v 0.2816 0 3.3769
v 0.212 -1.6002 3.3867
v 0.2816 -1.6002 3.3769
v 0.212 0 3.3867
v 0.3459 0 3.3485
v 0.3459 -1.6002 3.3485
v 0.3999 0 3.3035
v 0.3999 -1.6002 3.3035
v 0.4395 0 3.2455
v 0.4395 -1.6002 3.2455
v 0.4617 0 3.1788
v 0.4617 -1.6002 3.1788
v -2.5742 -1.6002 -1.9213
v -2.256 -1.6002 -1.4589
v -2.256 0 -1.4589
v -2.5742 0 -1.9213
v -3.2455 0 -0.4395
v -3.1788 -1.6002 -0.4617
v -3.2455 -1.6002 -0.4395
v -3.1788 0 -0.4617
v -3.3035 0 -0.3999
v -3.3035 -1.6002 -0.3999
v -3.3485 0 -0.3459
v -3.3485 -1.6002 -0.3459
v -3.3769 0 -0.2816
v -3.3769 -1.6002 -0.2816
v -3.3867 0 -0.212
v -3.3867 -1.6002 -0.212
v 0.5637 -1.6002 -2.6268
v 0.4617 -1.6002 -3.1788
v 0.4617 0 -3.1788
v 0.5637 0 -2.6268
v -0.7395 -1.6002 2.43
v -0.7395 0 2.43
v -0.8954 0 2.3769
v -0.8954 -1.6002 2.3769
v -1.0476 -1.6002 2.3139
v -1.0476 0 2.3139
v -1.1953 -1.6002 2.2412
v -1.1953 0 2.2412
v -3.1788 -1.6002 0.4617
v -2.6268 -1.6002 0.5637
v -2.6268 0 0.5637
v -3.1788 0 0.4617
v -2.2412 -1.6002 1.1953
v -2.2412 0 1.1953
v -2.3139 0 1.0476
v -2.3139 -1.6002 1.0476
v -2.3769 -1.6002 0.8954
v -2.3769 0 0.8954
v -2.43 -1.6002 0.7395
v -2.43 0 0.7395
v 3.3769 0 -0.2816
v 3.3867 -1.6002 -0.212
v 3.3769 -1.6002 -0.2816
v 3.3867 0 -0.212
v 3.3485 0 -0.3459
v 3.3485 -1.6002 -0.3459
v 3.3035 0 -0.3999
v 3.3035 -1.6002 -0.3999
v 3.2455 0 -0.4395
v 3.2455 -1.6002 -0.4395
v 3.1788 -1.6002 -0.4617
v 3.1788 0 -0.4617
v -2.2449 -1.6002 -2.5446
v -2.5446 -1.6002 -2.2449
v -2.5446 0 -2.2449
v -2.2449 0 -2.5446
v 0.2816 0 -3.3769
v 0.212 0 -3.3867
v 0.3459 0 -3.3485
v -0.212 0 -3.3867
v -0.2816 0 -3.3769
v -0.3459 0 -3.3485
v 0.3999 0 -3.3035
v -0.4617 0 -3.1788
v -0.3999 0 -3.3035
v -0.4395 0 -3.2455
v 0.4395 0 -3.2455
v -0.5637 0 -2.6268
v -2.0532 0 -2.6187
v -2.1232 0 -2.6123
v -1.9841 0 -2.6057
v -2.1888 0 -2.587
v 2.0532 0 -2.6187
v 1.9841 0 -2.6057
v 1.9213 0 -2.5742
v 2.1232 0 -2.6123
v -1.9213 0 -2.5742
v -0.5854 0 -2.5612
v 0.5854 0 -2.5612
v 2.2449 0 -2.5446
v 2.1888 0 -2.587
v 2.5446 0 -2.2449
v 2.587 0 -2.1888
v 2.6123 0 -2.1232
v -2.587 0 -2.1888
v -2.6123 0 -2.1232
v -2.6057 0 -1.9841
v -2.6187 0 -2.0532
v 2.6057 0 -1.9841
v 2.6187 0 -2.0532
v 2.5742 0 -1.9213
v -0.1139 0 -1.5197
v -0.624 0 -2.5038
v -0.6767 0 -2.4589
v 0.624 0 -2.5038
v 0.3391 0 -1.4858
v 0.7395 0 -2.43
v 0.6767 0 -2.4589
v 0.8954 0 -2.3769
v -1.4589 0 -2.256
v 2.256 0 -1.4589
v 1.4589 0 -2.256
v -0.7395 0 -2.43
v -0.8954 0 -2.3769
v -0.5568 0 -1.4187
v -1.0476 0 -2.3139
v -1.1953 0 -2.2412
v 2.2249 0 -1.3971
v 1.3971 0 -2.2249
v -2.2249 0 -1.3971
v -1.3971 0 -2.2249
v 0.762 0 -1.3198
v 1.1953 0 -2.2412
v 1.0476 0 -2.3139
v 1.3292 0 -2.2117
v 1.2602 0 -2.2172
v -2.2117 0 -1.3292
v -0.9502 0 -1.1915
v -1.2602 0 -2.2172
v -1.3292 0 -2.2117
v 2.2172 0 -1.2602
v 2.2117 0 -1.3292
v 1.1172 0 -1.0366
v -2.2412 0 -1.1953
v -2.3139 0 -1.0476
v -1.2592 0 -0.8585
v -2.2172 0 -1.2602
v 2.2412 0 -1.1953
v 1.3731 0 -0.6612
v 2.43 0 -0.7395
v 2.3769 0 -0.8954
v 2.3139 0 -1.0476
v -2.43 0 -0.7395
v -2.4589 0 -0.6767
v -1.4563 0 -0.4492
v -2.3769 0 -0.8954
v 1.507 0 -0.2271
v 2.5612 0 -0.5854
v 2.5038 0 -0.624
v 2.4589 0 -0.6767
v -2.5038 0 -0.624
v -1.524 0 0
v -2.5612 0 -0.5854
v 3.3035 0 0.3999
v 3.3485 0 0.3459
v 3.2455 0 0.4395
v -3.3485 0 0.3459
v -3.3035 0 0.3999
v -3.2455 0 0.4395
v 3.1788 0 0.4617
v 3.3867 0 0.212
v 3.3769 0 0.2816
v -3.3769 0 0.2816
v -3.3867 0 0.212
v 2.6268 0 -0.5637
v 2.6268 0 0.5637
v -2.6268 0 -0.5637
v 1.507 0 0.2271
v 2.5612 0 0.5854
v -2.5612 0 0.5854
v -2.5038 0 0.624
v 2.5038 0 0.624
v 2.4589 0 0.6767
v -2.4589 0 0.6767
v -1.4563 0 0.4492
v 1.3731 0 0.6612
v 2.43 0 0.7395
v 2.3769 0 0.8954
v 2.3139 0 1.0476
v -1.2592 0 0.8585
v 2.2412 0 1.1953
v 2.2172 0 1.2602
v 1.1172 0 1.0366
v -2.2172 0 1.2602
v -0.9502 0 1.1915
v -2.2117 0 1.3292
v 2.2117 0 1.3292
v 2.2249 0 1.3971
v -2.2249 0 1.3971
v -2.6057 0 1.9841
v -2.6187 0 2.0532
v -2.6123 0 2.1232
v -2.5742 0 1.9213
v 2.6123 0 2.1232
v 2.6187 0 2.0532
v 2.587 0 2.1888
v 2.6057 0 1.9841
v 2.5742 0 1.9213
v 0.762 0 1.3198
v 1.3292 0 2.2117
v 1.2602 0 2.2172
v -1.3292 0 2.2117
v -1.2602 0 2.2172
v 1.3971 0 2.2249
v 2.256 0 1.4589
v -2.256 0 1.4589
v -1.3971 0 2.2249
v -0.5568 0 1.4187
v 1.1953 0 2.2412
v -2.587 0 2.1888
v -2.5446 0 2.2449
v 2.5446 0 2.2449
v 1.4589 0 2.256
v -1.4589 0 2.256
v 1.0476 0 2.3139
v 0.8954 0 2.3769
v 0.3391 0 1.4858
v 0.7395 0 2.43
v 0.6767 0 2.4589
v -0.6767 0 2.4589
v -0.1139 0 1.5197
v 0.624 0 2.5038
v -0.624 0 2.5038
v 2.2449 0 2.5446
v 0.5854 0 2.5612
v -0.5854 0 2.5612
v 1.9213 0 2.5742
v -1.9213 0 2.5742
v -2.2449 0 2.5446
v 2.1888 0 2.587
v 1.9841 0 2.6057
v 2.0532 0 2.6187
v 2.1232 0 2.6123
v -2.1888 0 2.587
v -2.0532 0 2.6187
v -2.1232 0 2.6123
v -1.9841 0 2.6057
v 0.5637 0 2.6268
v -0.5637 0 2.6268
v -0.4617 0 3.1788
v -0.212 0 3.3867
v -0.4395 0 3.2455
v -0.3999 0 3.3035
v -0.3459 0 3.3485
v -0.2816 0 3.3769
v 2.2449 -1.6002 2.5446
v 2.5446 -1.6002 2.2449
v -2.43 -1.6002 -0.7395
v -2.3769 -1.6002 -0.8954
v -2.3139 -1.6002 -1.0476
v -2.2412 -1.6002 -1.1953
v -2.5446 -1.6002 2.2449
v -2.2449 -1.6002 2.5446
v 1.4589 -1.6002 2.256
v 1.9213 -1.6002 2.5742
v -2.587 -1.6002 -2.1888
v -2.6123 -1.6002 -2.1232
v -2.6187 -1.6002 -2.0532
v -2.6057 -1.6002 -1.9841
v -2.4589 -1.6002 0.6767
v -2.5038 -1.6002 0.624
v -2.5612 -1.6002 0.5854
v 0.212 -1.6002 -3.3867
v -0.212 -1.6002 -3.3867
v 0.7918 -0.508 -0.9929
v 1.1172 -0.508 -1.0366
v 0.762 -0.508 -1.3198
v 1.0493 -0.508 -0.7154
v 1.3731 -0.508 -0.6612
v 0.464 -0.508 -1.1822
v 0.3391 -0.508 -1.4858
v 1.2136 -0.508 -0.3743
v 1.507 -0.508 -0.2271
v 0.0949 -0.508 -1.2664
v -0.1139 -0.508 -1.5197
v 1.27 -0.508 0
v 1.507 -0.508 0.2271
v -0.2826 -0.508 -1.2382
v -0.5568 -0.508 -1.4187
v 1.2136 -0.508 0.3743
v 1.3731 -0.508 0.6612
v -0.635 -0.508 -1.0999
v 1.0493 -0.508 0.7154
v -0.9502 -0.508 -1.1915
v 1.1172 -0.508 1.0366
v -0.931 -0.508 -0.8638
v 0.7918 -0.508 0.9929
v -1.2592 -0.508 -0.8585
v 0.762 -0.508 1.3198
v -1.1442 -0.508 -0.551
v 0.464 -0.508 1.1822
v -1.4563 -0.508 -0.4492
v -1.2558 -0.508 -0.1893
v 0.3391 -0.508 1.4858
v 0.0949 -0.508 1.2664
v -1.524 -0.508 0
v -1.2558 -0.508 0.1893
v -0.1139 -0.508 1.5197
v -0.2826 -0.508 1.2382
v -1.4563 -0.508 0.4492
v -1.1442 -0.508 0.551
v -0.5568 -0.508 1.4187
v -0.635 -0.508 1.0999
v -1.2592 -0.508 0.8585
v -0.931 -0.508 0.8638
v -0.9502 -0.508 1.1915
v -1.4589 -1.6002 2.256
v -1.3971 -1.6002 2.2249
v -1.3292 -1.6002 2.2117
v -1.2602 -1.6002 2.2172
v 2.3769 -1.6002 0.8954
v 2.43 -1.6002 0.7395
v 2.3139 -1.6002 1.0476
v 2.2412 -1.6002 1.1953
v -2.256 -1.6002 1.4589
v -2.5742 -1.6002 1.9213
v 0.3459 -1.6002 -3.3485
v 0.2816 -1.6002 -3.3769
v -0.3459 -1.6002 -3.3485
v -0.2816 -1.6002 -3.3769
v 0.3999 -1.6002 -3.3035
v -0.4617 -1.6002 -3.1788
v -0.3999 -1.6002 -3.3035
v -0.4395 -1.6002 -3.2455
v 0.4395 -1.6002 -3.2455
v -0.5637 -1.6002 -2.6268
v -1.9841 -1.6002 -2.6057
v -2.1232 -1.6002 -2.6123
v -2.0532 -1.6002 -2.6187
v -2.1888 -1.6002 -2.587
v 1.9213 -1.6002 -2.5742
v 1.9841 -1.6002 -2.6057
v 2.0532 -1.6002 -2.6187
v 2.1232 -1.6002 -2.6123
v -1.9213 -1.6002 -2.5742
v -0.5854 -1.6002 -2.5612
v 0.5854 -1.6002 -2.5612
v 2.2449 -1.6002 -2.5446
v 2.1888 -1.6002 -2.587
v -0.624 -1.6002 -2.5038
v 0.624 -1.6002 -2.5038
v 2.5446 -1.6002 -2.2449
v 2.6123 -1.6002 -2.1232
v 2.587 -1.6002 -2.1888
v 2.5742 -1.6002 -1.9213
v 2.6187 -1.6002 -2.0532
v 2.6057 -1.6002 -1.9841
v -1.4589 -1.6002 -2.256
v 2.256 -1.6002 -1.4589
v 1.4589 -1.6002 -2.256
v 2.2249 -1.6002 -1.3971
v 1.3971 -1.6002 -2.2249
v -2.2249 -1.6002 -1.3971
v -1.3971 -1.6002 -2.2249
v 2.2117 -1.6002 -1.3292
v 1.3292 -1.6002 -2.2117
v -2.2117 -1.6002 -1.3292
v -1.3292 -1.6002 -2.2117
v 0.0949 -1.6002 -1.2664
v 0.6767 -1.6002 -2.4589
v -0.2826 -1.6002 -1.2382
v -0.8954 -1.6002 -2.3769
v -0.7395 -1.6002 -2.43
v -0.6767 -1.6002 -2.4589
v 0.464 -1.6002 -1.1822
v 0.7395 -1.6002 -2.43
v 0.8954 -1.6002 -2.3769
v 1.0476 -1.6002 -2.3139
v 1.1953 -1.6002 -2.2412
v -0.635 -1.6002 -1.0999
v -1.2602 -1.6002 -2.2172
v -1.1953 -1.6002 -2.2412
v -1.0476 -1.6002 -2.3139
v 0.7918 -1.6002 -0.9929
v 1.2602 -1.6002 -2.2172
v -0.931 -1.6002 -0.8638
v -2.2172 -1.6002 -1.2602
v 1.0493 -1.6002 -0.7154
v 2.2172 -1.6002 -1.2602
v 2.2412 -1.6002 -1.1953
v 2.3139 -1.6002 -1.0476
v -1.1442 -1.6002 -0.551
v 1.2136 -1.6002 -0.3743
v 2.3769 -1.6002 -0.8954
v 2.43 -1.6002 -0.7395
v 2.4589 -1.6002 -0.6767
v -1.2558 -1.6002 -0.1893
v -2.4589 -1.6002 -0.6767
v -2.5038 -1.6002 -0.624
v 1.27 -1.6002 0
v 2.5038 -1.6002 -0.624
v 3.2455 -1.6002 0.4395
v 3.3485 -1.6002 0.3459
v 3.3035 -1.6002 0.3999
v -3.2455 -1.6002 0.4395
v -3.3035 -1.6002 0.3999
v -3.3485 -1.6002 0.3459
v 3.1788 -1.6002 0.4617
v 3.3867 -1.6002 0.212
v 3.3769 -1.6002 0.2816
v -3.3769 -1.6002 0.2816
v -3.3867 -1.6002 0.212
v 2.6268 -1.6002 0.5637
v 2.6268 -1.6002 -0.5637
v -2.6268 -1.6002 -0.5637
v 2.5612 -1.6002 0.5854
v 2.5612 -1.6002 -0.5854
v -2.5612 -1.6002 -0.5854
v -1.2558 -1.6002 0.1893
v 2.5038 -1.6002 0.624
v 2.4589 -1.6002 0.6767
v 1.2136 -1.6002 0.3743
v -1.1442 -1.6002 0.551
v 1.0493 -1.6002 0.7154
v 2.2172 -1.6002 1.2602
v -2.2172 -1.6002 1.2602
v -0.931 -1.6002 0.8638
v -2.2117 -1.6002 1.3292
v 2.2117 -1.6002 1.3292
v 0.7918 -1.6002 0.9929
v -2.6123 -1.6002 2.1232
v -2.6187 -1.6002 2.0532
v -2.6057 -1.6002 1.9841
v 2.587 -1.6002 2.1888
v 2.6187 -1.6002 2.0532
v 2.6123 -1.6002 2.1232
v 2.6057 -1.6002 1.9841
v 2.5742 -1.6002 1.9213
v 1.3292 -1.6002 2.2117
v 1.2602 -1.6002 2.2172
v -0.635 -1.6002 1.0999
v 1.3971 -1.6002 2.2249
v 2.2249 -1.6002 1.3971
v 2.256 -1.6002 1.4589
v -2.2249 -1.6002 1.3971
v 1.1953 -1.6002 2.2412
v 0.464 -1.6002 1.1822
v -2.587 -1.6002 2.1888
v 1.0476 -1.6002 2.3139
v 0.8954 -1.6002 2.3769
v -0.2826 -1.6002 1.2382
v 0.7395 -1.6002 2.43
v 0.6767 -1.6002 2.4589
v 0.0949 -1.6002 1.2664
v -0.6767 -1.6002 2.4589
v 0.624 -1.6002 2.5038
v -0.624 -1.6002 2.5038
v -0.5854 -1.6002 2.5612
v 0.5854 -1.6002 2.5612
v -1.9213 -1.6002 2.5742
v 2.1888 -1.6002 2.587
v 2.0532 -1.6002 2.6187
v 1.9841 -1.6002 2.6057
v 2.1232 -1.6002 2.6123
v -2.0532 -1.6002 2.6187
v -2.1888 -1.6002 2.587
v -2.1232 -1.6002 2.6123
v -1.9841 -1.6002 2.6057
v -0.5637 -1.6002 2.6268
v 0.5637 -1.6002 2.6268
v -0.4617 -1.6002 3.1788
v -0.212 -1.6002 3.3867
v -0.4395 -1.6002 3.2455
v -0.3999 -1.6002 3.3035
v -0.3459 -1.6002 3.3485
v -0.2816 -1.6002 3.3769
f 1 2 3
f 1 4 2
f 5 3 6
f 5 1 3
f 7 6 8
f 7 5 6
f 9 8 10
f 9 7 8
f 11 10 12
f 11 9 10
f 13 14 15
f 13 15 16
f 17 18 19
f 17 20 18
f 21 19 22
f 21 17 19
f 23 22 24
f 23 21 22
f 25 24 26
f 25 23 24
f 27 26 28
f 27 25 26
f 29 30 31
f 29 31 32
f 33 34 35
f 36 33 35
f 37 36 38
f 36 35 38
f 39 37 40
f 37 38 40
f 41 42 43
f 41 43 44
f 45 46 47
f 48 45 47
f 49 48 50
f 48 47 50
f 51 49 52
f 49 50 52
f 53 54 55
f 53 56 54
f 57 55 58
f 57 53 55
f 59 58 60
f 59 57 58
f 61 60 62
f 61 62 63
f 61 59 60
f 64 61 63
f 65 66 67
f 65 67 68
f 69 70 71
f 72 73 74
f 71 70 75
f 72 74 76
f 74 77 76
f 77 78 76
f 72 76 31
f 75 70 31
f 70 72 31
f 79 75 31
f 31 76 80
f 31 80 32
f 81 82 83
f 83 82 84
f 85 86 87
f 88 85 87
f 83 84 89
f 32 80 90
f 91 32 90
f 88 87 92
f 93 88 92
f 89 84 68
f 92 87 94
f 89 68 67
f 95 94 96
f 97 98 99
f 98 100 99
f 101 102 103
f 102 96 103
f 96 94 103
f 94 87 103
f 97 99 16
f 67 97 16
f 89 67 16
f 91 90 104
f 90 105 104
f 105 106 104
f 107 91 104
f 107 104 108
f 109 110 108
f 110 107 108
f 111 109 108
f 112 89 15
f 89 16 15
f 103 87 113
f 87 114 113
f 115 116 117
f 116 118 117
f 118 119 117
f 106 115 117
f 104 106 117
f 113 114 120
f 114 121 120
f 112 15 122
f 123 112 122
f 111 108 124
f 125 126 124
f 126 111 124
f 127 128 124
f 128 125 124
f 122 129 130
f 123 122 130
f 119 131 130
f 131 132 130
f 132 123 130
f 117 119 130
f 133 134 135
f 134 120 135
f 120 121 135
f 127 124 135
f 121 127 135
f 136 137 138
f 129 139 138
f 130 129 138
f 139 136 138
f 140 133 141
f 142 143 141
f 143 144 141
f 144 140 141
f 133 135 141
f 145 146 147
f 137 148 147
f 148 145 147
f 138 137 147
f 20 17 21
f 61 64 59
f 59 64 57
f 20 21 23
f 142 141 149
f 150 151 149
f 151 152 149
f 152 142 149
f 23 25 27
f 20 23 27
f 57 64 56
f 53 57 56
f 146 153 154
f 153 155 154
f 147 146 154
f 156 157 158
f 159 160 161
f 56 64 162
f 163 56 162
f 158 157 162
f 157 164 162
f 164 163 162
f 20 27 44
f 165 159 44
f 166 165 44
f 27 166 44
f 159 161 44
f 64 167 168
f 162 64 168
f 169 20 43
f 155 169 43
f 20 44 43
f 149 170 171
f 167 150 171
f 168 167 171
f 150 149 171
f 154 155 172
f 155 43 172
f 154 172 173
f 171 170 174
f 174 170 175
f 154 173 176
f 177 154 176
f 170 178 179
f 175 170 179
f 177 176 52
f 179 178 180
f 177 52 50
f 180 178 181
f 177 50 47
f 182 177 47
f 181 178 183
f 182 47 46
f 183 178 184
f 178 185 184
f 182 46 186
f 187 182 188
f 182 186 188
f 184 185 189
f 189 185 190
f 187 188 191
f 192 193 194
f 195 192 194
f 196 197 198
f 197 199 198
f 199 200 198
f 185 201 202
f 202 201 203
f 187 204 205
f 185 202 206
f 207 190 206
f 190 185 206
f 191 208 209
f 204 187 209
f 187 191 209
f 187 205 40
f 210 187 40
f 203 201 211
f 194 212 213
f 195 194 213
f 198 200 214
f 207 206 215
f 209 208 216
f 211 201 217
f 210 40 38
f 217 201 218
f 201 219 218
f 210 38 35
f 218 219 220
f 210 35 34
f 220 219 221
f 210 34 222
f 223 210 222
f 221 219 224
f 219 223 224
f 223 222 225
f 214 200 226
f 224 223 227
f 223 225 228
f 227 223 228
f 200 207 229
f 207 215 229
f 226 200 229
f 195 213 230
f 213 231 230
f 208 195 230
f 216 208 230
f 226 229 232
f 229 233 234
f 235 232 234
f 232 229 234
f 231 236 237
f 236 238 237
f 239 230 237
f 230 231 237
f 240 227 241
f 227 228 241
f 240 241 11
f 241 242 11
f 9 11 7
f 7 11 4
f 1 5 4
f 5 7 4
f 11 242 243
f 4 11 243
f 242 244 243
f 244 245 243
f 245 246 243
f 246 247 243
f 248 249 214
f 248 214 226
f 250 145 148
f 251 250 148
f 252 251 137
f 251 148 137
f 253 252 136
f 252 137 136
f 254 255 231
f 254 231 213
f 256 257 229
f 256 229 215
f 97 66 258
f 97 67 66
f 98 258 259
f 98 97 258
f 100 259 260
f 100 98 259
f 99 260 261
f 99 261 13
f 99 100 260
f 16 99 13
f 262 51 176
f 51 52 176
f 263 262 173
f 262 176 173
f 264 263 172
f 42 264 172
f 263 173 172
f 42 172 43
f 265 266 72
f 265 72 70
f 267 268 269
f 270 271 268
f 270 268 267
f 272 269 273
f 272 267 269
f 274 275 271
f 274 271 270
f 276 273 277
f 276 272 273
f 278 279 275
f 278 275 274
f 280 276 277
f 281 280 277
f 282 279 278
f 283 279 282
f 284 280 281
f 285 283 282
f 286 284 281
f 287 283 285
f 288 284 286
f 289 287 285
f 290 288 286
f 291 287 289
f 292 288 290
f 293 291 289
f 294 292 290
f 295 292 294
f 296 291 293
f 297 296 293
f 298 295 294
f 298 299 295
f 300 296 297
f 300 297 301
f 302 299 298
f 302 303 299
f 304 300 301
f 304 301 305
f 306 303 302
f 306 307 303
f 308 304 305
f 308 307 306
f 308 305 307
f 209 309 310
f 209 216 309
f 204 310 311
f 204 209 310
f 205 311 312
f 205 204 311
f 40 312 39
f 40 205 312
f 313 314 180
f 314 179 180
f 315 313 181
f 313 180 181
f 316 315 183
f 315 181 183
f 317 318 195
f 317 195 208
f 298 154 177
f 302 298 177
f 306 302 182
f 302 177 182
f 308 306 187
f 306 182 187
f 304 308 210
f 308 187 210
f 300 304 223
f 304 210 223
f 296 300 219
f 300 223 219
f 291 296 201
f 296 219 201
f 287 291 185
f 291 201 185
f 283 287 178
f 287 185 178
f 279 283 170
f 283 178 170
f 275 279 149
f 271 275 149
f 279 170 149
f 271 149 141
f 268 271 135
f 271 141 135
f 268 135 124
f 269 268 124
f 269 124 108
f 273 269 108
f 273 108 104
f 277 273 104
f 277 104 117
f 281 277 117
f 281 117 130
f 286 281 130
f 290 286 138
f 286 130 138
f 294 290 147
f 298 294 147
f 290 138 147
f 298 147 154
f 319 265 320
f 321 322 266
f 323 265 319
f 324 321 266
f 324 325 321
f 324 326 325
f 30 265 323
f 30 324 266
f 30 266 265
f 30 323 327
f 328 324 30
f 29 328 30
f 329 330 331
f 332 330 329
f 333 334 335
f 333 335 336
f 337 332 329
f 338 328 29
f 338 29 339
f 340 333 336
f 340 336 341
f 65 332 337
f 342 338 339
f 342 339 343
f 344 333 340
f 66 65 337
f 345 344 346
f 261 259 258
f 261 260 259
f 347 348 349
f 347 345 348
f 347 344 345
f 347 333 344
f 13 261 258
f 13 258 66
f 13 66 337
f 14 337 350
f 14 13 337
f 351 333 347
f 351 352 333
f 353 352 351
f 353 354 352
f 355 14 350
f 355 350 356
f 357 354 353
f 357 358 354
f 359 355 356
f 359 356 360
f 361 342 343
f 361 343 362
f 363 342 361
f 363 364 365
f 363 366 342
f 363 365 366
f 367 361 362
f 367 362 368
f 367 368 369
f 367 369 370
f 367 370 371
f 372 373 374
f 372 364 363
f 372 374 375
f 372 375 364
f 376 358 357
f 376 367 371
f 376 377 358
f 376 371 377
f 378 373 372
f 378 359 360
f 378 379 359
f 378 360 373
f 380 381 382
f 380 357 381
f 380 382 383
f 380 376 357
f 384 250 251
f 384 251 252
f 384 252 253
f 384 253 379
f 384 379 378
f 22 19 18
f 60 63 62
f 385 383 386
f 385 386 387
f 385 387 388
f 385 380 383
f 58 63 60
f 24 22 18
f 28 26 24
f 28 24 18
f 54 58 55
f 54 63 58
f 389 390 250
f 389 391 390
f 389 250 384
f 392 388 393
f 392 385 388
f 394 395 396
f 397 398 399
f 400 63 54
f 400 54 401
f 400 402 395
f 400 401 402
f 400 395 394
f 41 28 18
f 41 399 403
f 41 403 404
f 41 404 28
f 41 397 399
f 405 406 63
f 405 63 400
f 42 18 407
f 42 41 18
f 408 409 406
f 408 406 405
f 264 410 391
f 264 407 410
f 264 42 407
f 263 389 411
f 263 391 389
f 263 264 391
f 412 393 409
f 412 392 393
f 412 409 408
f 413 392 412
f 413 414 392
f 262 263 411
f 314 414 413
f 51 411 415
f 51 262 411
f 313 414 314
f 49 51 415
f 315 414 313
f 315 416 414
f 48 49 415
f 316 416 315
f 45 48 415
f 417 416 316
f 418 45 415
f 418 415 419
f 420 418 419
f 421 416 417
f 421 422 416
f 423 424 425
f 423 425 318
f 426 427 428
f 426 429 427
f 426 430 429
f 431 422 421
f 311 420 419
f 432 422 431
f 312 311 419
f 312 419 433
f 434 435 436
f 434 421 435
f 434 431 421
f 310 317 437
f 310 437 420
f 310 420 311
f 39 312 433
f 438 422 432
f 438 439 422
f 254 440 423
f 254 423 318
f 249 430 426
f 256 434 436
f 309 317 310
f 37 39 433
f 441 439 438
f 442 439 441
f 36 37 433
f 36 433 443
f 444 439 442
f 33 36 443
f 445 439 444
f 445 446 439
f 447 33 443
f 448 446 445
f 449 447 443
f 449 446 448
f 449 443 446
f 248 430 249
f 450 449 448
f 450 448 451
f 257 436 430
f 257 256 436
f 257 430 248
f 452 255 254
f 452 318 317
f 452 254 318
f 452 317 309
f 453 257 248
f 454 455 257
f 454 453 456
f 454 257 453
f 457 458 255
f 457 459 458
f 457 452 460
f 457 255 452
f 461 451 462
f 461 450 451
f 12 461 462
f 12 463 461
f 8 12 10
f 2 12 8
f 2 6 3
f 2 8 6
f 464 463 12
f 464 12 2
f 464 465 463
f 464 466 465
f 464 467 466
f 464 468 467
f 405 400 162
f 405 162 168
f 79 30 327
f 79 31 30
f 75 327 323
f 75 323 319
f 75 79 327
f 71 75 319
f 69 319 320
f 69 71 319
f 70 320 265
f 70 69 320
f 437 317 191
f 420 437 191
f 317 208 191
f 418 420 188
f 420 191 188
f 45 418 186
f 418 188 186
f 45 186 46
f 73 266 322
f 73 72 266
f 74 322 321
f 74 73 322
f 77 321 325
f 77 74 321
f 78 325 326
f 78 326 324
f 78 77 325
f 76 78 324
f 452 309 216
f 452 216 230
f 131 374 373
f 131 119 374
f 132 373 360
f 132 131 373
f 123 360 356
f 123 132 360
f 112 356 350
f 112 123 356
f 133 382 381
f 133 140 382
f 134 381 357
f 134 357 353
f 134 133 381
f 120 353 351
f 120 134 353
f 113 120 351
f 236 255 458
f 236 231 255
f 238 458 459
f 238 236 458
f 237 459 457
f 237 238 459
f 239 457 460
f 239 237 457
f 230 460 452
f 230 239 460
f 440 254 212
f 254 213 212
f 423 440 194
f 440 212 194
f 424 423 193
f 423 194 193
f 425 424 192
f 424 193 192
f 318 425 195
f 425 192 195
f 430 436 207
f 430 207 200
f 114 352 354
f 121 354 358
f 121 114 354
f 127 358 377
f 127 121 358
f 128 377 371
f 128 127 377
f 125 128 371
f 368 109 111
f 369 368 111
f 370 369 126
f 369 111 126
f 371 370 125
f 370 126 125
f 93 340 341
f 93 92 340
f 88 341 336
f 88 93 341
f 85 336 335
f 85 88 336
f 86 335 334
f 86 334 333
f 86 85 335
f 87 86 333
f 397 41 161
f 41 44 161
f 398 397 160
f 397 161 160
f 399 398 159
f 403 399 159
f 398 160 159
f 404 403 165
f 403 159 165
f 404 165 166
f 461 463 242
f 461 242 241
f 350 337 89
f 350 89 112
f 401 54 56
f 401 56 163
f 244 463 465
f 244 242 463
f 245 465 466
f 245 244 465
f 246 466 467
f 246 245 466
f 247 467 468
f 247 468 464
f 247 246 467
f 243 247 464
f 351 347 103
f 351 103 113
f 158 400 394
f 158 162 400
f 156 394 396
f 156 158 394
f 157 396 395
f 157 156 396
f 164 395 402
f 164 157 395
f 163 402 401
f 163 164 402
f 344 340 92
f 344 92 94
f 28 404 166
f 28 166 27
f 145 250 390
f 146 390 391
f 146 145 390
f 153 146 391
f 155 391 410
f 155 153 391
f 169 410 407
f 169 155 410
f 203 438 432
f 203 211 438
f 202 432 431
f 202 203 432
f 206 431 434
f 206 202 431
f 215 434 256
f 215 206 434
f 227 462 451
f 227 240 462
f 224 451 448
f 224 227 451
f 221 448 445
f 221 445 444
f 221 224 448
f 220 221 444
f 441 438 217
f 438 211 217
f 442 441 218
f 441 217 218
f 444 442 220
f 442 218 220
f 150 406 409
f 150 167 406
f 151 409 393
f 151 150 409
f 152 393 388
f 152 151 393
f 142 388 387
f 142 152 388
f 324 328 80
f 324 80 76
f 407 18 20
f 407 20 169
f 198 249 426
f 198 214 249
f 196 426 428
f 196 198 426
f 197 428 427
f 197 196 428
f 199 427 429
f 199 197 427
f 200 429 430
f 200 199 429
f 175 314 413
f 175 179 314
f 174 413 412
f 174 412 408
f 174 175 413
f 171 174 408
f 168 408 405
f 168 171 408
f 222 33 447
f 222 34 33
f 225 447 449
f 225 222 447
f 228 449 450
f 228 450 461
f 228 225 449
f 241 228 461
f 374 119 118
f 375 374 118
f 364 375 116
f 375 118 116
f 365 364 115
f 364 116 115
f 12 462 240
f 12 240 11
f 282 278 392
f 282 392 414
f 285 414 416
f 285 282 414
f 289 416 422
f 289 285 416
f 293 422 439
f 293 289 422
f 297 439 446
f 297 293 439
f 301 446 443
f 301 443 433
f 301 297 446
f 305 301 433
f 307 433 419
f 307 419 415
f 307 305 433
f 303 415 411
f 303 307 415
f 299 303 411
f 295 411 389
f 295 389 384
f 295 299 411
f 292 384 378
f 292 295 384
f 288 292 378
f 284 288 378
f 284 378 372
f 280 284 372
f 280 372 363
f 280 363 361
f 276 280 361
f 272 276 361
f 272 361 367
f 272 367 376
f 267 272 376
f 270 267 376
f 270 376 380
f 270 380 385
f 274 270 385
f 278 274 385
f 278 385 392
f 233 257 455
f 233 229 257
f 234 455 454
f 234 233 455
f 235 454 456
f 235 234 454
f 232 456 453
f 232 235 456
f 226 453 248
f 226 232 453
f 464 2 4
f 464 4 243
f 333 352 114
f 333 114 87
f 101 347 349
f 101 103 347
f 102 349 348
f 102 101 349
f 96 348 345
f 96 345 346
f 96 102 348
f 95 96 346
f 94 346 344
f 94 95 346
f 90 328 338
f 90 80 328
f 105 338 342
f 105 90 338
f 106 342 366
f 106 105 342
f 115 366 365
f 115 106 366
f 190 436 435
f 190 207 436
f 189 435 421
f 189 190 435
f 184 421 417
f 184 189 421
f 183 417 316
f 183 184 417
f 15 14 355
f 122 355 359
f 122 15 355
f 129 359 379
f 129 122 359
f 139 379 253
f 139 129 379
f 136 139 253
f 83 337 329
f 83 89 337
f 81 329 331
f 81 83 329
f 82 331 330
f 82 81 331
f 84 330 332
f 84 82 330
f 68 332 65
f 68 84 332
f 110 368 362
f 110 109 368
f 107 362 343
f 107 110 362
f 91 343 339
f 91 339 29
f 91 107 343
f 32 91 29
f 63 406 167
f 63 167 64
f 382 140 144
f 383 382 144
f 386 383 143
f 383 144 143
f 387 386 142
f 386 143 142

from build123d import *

# Parameters (mm, degrees)
F0_R            = 2.54
F0_R_2          = 1.27
F1_DEPTH        = 1.6002
F3_DEPTH        = 1.6002
F3_COPIES_COUNT = 8
F5_R            = 0.254
F6_R            = 1.524
F7_DEPTH        = 0.508


# Not quite as in the source:
# - a pattern or mirror of a feature is missing from the dataset's text; its kind, count and spacing are read off the source's solid


with BuildPart() as f1:
    # F0 (on Front) → F1 (new body)
    with BuildSketch(Plane.XZ):
        Circle(F0_R)
        Circle(F0_R_2, mode=Mode.SUBTRACT)
    extrude(amount=F1_DEPTH)

    # F2 (on face) → F3 (join, through all)
    with BuildSketch(Plane.XZ.offset(1.6002)):
        Polygon((0.4233333333, 3.3866666667), (-0.4233333333, 3.3866666667), (-0.5926666667, 2.4698878967), (0.5926666667, 2.4698878967), align=None)
    f3 = extrude(amount=-F3_DEPTH)

    # F3_copies: F3 ×8 about axis
    f3_copies_axis = Axis((0, 0, 0), (0, 1, 0))
    for i in range(1, F3_COPIES_COUNT):
        add(f3.rotate(f3_copies_axis, i * 360 / F3_COPIES_COUNT))

    # F5
    f5_edges = [f1.edges().sort_by_distance(p)[0] for p in [
        (-0.423333, -0.8001, 3.386667),
        (-0.592667, -0.8001, 2.469888),
        (0.423333, -0.8001, 3.386667),
        (0.592667, -0.8001, 2.469888),
        (-1.327396, -0.8001, 2.165553),
        (-2.095393, -0.8001, 2.694077),
        (2.165553, -0.8001, 1.327396),
        (2.694077, -0.8001, 2.095393),
        (2.469888, -0.8001, 0.592667),
        (3.386667, -0.8001, 0.423333),
        (3.386667, -0.8001, -0.423333),
        (2.469888, -0.8001, -0.592667),
        (2.165553, -0.8001, -1.327396),
        (2.694077, -0.8001, -2.095393),
        (2.095393, -0.8001, -2.694077),
        (1.327396, -0.8001, -2.165553),
        (0.592667, -0.8001, -2.469888),
        (0.423333, -0.8001, -3.386667),
        (-0.423333, -0.8001, -3.386667),
        (-0.592667, -0.8001, -2.469888),
        (-1.327396, -0.8001, -2.165553),
        (-2.095393, -0.8001, -2.694077),
        (-2.694077, -0.8001, -2.095393),
        (-2.165553, -0.8001, -1.327396),
        (-2.469888, -0.8001, -0.592667),
        (-3.386667, -0.8001, -0.423333),
        (-3.386667, -0.8001, 0.423333),
        (-2.469888, -0.8001, 0.592667),
        (-2.165553, -0.8001, 1.327396),
        (1.327396, -0.8001, 2.165553),
        (2.095393, -0.8001, 2.694077),
        (-2.694077, -0.8001, 2.095393),
    ]]
    fillet(f5_edges, radius=F5_R)

    # F6 (on face) → F7 (cut)
    with BuildSketch(Plane(origin=(0, 0, 0), x_dir=(-1, 0, 0), z_dir=(0, 1, 0))):
        Circle(F6_R)
    extrude(amount=-F7_DEPTH, mode=Mode.SUBTRACT)


solid = f1.part
